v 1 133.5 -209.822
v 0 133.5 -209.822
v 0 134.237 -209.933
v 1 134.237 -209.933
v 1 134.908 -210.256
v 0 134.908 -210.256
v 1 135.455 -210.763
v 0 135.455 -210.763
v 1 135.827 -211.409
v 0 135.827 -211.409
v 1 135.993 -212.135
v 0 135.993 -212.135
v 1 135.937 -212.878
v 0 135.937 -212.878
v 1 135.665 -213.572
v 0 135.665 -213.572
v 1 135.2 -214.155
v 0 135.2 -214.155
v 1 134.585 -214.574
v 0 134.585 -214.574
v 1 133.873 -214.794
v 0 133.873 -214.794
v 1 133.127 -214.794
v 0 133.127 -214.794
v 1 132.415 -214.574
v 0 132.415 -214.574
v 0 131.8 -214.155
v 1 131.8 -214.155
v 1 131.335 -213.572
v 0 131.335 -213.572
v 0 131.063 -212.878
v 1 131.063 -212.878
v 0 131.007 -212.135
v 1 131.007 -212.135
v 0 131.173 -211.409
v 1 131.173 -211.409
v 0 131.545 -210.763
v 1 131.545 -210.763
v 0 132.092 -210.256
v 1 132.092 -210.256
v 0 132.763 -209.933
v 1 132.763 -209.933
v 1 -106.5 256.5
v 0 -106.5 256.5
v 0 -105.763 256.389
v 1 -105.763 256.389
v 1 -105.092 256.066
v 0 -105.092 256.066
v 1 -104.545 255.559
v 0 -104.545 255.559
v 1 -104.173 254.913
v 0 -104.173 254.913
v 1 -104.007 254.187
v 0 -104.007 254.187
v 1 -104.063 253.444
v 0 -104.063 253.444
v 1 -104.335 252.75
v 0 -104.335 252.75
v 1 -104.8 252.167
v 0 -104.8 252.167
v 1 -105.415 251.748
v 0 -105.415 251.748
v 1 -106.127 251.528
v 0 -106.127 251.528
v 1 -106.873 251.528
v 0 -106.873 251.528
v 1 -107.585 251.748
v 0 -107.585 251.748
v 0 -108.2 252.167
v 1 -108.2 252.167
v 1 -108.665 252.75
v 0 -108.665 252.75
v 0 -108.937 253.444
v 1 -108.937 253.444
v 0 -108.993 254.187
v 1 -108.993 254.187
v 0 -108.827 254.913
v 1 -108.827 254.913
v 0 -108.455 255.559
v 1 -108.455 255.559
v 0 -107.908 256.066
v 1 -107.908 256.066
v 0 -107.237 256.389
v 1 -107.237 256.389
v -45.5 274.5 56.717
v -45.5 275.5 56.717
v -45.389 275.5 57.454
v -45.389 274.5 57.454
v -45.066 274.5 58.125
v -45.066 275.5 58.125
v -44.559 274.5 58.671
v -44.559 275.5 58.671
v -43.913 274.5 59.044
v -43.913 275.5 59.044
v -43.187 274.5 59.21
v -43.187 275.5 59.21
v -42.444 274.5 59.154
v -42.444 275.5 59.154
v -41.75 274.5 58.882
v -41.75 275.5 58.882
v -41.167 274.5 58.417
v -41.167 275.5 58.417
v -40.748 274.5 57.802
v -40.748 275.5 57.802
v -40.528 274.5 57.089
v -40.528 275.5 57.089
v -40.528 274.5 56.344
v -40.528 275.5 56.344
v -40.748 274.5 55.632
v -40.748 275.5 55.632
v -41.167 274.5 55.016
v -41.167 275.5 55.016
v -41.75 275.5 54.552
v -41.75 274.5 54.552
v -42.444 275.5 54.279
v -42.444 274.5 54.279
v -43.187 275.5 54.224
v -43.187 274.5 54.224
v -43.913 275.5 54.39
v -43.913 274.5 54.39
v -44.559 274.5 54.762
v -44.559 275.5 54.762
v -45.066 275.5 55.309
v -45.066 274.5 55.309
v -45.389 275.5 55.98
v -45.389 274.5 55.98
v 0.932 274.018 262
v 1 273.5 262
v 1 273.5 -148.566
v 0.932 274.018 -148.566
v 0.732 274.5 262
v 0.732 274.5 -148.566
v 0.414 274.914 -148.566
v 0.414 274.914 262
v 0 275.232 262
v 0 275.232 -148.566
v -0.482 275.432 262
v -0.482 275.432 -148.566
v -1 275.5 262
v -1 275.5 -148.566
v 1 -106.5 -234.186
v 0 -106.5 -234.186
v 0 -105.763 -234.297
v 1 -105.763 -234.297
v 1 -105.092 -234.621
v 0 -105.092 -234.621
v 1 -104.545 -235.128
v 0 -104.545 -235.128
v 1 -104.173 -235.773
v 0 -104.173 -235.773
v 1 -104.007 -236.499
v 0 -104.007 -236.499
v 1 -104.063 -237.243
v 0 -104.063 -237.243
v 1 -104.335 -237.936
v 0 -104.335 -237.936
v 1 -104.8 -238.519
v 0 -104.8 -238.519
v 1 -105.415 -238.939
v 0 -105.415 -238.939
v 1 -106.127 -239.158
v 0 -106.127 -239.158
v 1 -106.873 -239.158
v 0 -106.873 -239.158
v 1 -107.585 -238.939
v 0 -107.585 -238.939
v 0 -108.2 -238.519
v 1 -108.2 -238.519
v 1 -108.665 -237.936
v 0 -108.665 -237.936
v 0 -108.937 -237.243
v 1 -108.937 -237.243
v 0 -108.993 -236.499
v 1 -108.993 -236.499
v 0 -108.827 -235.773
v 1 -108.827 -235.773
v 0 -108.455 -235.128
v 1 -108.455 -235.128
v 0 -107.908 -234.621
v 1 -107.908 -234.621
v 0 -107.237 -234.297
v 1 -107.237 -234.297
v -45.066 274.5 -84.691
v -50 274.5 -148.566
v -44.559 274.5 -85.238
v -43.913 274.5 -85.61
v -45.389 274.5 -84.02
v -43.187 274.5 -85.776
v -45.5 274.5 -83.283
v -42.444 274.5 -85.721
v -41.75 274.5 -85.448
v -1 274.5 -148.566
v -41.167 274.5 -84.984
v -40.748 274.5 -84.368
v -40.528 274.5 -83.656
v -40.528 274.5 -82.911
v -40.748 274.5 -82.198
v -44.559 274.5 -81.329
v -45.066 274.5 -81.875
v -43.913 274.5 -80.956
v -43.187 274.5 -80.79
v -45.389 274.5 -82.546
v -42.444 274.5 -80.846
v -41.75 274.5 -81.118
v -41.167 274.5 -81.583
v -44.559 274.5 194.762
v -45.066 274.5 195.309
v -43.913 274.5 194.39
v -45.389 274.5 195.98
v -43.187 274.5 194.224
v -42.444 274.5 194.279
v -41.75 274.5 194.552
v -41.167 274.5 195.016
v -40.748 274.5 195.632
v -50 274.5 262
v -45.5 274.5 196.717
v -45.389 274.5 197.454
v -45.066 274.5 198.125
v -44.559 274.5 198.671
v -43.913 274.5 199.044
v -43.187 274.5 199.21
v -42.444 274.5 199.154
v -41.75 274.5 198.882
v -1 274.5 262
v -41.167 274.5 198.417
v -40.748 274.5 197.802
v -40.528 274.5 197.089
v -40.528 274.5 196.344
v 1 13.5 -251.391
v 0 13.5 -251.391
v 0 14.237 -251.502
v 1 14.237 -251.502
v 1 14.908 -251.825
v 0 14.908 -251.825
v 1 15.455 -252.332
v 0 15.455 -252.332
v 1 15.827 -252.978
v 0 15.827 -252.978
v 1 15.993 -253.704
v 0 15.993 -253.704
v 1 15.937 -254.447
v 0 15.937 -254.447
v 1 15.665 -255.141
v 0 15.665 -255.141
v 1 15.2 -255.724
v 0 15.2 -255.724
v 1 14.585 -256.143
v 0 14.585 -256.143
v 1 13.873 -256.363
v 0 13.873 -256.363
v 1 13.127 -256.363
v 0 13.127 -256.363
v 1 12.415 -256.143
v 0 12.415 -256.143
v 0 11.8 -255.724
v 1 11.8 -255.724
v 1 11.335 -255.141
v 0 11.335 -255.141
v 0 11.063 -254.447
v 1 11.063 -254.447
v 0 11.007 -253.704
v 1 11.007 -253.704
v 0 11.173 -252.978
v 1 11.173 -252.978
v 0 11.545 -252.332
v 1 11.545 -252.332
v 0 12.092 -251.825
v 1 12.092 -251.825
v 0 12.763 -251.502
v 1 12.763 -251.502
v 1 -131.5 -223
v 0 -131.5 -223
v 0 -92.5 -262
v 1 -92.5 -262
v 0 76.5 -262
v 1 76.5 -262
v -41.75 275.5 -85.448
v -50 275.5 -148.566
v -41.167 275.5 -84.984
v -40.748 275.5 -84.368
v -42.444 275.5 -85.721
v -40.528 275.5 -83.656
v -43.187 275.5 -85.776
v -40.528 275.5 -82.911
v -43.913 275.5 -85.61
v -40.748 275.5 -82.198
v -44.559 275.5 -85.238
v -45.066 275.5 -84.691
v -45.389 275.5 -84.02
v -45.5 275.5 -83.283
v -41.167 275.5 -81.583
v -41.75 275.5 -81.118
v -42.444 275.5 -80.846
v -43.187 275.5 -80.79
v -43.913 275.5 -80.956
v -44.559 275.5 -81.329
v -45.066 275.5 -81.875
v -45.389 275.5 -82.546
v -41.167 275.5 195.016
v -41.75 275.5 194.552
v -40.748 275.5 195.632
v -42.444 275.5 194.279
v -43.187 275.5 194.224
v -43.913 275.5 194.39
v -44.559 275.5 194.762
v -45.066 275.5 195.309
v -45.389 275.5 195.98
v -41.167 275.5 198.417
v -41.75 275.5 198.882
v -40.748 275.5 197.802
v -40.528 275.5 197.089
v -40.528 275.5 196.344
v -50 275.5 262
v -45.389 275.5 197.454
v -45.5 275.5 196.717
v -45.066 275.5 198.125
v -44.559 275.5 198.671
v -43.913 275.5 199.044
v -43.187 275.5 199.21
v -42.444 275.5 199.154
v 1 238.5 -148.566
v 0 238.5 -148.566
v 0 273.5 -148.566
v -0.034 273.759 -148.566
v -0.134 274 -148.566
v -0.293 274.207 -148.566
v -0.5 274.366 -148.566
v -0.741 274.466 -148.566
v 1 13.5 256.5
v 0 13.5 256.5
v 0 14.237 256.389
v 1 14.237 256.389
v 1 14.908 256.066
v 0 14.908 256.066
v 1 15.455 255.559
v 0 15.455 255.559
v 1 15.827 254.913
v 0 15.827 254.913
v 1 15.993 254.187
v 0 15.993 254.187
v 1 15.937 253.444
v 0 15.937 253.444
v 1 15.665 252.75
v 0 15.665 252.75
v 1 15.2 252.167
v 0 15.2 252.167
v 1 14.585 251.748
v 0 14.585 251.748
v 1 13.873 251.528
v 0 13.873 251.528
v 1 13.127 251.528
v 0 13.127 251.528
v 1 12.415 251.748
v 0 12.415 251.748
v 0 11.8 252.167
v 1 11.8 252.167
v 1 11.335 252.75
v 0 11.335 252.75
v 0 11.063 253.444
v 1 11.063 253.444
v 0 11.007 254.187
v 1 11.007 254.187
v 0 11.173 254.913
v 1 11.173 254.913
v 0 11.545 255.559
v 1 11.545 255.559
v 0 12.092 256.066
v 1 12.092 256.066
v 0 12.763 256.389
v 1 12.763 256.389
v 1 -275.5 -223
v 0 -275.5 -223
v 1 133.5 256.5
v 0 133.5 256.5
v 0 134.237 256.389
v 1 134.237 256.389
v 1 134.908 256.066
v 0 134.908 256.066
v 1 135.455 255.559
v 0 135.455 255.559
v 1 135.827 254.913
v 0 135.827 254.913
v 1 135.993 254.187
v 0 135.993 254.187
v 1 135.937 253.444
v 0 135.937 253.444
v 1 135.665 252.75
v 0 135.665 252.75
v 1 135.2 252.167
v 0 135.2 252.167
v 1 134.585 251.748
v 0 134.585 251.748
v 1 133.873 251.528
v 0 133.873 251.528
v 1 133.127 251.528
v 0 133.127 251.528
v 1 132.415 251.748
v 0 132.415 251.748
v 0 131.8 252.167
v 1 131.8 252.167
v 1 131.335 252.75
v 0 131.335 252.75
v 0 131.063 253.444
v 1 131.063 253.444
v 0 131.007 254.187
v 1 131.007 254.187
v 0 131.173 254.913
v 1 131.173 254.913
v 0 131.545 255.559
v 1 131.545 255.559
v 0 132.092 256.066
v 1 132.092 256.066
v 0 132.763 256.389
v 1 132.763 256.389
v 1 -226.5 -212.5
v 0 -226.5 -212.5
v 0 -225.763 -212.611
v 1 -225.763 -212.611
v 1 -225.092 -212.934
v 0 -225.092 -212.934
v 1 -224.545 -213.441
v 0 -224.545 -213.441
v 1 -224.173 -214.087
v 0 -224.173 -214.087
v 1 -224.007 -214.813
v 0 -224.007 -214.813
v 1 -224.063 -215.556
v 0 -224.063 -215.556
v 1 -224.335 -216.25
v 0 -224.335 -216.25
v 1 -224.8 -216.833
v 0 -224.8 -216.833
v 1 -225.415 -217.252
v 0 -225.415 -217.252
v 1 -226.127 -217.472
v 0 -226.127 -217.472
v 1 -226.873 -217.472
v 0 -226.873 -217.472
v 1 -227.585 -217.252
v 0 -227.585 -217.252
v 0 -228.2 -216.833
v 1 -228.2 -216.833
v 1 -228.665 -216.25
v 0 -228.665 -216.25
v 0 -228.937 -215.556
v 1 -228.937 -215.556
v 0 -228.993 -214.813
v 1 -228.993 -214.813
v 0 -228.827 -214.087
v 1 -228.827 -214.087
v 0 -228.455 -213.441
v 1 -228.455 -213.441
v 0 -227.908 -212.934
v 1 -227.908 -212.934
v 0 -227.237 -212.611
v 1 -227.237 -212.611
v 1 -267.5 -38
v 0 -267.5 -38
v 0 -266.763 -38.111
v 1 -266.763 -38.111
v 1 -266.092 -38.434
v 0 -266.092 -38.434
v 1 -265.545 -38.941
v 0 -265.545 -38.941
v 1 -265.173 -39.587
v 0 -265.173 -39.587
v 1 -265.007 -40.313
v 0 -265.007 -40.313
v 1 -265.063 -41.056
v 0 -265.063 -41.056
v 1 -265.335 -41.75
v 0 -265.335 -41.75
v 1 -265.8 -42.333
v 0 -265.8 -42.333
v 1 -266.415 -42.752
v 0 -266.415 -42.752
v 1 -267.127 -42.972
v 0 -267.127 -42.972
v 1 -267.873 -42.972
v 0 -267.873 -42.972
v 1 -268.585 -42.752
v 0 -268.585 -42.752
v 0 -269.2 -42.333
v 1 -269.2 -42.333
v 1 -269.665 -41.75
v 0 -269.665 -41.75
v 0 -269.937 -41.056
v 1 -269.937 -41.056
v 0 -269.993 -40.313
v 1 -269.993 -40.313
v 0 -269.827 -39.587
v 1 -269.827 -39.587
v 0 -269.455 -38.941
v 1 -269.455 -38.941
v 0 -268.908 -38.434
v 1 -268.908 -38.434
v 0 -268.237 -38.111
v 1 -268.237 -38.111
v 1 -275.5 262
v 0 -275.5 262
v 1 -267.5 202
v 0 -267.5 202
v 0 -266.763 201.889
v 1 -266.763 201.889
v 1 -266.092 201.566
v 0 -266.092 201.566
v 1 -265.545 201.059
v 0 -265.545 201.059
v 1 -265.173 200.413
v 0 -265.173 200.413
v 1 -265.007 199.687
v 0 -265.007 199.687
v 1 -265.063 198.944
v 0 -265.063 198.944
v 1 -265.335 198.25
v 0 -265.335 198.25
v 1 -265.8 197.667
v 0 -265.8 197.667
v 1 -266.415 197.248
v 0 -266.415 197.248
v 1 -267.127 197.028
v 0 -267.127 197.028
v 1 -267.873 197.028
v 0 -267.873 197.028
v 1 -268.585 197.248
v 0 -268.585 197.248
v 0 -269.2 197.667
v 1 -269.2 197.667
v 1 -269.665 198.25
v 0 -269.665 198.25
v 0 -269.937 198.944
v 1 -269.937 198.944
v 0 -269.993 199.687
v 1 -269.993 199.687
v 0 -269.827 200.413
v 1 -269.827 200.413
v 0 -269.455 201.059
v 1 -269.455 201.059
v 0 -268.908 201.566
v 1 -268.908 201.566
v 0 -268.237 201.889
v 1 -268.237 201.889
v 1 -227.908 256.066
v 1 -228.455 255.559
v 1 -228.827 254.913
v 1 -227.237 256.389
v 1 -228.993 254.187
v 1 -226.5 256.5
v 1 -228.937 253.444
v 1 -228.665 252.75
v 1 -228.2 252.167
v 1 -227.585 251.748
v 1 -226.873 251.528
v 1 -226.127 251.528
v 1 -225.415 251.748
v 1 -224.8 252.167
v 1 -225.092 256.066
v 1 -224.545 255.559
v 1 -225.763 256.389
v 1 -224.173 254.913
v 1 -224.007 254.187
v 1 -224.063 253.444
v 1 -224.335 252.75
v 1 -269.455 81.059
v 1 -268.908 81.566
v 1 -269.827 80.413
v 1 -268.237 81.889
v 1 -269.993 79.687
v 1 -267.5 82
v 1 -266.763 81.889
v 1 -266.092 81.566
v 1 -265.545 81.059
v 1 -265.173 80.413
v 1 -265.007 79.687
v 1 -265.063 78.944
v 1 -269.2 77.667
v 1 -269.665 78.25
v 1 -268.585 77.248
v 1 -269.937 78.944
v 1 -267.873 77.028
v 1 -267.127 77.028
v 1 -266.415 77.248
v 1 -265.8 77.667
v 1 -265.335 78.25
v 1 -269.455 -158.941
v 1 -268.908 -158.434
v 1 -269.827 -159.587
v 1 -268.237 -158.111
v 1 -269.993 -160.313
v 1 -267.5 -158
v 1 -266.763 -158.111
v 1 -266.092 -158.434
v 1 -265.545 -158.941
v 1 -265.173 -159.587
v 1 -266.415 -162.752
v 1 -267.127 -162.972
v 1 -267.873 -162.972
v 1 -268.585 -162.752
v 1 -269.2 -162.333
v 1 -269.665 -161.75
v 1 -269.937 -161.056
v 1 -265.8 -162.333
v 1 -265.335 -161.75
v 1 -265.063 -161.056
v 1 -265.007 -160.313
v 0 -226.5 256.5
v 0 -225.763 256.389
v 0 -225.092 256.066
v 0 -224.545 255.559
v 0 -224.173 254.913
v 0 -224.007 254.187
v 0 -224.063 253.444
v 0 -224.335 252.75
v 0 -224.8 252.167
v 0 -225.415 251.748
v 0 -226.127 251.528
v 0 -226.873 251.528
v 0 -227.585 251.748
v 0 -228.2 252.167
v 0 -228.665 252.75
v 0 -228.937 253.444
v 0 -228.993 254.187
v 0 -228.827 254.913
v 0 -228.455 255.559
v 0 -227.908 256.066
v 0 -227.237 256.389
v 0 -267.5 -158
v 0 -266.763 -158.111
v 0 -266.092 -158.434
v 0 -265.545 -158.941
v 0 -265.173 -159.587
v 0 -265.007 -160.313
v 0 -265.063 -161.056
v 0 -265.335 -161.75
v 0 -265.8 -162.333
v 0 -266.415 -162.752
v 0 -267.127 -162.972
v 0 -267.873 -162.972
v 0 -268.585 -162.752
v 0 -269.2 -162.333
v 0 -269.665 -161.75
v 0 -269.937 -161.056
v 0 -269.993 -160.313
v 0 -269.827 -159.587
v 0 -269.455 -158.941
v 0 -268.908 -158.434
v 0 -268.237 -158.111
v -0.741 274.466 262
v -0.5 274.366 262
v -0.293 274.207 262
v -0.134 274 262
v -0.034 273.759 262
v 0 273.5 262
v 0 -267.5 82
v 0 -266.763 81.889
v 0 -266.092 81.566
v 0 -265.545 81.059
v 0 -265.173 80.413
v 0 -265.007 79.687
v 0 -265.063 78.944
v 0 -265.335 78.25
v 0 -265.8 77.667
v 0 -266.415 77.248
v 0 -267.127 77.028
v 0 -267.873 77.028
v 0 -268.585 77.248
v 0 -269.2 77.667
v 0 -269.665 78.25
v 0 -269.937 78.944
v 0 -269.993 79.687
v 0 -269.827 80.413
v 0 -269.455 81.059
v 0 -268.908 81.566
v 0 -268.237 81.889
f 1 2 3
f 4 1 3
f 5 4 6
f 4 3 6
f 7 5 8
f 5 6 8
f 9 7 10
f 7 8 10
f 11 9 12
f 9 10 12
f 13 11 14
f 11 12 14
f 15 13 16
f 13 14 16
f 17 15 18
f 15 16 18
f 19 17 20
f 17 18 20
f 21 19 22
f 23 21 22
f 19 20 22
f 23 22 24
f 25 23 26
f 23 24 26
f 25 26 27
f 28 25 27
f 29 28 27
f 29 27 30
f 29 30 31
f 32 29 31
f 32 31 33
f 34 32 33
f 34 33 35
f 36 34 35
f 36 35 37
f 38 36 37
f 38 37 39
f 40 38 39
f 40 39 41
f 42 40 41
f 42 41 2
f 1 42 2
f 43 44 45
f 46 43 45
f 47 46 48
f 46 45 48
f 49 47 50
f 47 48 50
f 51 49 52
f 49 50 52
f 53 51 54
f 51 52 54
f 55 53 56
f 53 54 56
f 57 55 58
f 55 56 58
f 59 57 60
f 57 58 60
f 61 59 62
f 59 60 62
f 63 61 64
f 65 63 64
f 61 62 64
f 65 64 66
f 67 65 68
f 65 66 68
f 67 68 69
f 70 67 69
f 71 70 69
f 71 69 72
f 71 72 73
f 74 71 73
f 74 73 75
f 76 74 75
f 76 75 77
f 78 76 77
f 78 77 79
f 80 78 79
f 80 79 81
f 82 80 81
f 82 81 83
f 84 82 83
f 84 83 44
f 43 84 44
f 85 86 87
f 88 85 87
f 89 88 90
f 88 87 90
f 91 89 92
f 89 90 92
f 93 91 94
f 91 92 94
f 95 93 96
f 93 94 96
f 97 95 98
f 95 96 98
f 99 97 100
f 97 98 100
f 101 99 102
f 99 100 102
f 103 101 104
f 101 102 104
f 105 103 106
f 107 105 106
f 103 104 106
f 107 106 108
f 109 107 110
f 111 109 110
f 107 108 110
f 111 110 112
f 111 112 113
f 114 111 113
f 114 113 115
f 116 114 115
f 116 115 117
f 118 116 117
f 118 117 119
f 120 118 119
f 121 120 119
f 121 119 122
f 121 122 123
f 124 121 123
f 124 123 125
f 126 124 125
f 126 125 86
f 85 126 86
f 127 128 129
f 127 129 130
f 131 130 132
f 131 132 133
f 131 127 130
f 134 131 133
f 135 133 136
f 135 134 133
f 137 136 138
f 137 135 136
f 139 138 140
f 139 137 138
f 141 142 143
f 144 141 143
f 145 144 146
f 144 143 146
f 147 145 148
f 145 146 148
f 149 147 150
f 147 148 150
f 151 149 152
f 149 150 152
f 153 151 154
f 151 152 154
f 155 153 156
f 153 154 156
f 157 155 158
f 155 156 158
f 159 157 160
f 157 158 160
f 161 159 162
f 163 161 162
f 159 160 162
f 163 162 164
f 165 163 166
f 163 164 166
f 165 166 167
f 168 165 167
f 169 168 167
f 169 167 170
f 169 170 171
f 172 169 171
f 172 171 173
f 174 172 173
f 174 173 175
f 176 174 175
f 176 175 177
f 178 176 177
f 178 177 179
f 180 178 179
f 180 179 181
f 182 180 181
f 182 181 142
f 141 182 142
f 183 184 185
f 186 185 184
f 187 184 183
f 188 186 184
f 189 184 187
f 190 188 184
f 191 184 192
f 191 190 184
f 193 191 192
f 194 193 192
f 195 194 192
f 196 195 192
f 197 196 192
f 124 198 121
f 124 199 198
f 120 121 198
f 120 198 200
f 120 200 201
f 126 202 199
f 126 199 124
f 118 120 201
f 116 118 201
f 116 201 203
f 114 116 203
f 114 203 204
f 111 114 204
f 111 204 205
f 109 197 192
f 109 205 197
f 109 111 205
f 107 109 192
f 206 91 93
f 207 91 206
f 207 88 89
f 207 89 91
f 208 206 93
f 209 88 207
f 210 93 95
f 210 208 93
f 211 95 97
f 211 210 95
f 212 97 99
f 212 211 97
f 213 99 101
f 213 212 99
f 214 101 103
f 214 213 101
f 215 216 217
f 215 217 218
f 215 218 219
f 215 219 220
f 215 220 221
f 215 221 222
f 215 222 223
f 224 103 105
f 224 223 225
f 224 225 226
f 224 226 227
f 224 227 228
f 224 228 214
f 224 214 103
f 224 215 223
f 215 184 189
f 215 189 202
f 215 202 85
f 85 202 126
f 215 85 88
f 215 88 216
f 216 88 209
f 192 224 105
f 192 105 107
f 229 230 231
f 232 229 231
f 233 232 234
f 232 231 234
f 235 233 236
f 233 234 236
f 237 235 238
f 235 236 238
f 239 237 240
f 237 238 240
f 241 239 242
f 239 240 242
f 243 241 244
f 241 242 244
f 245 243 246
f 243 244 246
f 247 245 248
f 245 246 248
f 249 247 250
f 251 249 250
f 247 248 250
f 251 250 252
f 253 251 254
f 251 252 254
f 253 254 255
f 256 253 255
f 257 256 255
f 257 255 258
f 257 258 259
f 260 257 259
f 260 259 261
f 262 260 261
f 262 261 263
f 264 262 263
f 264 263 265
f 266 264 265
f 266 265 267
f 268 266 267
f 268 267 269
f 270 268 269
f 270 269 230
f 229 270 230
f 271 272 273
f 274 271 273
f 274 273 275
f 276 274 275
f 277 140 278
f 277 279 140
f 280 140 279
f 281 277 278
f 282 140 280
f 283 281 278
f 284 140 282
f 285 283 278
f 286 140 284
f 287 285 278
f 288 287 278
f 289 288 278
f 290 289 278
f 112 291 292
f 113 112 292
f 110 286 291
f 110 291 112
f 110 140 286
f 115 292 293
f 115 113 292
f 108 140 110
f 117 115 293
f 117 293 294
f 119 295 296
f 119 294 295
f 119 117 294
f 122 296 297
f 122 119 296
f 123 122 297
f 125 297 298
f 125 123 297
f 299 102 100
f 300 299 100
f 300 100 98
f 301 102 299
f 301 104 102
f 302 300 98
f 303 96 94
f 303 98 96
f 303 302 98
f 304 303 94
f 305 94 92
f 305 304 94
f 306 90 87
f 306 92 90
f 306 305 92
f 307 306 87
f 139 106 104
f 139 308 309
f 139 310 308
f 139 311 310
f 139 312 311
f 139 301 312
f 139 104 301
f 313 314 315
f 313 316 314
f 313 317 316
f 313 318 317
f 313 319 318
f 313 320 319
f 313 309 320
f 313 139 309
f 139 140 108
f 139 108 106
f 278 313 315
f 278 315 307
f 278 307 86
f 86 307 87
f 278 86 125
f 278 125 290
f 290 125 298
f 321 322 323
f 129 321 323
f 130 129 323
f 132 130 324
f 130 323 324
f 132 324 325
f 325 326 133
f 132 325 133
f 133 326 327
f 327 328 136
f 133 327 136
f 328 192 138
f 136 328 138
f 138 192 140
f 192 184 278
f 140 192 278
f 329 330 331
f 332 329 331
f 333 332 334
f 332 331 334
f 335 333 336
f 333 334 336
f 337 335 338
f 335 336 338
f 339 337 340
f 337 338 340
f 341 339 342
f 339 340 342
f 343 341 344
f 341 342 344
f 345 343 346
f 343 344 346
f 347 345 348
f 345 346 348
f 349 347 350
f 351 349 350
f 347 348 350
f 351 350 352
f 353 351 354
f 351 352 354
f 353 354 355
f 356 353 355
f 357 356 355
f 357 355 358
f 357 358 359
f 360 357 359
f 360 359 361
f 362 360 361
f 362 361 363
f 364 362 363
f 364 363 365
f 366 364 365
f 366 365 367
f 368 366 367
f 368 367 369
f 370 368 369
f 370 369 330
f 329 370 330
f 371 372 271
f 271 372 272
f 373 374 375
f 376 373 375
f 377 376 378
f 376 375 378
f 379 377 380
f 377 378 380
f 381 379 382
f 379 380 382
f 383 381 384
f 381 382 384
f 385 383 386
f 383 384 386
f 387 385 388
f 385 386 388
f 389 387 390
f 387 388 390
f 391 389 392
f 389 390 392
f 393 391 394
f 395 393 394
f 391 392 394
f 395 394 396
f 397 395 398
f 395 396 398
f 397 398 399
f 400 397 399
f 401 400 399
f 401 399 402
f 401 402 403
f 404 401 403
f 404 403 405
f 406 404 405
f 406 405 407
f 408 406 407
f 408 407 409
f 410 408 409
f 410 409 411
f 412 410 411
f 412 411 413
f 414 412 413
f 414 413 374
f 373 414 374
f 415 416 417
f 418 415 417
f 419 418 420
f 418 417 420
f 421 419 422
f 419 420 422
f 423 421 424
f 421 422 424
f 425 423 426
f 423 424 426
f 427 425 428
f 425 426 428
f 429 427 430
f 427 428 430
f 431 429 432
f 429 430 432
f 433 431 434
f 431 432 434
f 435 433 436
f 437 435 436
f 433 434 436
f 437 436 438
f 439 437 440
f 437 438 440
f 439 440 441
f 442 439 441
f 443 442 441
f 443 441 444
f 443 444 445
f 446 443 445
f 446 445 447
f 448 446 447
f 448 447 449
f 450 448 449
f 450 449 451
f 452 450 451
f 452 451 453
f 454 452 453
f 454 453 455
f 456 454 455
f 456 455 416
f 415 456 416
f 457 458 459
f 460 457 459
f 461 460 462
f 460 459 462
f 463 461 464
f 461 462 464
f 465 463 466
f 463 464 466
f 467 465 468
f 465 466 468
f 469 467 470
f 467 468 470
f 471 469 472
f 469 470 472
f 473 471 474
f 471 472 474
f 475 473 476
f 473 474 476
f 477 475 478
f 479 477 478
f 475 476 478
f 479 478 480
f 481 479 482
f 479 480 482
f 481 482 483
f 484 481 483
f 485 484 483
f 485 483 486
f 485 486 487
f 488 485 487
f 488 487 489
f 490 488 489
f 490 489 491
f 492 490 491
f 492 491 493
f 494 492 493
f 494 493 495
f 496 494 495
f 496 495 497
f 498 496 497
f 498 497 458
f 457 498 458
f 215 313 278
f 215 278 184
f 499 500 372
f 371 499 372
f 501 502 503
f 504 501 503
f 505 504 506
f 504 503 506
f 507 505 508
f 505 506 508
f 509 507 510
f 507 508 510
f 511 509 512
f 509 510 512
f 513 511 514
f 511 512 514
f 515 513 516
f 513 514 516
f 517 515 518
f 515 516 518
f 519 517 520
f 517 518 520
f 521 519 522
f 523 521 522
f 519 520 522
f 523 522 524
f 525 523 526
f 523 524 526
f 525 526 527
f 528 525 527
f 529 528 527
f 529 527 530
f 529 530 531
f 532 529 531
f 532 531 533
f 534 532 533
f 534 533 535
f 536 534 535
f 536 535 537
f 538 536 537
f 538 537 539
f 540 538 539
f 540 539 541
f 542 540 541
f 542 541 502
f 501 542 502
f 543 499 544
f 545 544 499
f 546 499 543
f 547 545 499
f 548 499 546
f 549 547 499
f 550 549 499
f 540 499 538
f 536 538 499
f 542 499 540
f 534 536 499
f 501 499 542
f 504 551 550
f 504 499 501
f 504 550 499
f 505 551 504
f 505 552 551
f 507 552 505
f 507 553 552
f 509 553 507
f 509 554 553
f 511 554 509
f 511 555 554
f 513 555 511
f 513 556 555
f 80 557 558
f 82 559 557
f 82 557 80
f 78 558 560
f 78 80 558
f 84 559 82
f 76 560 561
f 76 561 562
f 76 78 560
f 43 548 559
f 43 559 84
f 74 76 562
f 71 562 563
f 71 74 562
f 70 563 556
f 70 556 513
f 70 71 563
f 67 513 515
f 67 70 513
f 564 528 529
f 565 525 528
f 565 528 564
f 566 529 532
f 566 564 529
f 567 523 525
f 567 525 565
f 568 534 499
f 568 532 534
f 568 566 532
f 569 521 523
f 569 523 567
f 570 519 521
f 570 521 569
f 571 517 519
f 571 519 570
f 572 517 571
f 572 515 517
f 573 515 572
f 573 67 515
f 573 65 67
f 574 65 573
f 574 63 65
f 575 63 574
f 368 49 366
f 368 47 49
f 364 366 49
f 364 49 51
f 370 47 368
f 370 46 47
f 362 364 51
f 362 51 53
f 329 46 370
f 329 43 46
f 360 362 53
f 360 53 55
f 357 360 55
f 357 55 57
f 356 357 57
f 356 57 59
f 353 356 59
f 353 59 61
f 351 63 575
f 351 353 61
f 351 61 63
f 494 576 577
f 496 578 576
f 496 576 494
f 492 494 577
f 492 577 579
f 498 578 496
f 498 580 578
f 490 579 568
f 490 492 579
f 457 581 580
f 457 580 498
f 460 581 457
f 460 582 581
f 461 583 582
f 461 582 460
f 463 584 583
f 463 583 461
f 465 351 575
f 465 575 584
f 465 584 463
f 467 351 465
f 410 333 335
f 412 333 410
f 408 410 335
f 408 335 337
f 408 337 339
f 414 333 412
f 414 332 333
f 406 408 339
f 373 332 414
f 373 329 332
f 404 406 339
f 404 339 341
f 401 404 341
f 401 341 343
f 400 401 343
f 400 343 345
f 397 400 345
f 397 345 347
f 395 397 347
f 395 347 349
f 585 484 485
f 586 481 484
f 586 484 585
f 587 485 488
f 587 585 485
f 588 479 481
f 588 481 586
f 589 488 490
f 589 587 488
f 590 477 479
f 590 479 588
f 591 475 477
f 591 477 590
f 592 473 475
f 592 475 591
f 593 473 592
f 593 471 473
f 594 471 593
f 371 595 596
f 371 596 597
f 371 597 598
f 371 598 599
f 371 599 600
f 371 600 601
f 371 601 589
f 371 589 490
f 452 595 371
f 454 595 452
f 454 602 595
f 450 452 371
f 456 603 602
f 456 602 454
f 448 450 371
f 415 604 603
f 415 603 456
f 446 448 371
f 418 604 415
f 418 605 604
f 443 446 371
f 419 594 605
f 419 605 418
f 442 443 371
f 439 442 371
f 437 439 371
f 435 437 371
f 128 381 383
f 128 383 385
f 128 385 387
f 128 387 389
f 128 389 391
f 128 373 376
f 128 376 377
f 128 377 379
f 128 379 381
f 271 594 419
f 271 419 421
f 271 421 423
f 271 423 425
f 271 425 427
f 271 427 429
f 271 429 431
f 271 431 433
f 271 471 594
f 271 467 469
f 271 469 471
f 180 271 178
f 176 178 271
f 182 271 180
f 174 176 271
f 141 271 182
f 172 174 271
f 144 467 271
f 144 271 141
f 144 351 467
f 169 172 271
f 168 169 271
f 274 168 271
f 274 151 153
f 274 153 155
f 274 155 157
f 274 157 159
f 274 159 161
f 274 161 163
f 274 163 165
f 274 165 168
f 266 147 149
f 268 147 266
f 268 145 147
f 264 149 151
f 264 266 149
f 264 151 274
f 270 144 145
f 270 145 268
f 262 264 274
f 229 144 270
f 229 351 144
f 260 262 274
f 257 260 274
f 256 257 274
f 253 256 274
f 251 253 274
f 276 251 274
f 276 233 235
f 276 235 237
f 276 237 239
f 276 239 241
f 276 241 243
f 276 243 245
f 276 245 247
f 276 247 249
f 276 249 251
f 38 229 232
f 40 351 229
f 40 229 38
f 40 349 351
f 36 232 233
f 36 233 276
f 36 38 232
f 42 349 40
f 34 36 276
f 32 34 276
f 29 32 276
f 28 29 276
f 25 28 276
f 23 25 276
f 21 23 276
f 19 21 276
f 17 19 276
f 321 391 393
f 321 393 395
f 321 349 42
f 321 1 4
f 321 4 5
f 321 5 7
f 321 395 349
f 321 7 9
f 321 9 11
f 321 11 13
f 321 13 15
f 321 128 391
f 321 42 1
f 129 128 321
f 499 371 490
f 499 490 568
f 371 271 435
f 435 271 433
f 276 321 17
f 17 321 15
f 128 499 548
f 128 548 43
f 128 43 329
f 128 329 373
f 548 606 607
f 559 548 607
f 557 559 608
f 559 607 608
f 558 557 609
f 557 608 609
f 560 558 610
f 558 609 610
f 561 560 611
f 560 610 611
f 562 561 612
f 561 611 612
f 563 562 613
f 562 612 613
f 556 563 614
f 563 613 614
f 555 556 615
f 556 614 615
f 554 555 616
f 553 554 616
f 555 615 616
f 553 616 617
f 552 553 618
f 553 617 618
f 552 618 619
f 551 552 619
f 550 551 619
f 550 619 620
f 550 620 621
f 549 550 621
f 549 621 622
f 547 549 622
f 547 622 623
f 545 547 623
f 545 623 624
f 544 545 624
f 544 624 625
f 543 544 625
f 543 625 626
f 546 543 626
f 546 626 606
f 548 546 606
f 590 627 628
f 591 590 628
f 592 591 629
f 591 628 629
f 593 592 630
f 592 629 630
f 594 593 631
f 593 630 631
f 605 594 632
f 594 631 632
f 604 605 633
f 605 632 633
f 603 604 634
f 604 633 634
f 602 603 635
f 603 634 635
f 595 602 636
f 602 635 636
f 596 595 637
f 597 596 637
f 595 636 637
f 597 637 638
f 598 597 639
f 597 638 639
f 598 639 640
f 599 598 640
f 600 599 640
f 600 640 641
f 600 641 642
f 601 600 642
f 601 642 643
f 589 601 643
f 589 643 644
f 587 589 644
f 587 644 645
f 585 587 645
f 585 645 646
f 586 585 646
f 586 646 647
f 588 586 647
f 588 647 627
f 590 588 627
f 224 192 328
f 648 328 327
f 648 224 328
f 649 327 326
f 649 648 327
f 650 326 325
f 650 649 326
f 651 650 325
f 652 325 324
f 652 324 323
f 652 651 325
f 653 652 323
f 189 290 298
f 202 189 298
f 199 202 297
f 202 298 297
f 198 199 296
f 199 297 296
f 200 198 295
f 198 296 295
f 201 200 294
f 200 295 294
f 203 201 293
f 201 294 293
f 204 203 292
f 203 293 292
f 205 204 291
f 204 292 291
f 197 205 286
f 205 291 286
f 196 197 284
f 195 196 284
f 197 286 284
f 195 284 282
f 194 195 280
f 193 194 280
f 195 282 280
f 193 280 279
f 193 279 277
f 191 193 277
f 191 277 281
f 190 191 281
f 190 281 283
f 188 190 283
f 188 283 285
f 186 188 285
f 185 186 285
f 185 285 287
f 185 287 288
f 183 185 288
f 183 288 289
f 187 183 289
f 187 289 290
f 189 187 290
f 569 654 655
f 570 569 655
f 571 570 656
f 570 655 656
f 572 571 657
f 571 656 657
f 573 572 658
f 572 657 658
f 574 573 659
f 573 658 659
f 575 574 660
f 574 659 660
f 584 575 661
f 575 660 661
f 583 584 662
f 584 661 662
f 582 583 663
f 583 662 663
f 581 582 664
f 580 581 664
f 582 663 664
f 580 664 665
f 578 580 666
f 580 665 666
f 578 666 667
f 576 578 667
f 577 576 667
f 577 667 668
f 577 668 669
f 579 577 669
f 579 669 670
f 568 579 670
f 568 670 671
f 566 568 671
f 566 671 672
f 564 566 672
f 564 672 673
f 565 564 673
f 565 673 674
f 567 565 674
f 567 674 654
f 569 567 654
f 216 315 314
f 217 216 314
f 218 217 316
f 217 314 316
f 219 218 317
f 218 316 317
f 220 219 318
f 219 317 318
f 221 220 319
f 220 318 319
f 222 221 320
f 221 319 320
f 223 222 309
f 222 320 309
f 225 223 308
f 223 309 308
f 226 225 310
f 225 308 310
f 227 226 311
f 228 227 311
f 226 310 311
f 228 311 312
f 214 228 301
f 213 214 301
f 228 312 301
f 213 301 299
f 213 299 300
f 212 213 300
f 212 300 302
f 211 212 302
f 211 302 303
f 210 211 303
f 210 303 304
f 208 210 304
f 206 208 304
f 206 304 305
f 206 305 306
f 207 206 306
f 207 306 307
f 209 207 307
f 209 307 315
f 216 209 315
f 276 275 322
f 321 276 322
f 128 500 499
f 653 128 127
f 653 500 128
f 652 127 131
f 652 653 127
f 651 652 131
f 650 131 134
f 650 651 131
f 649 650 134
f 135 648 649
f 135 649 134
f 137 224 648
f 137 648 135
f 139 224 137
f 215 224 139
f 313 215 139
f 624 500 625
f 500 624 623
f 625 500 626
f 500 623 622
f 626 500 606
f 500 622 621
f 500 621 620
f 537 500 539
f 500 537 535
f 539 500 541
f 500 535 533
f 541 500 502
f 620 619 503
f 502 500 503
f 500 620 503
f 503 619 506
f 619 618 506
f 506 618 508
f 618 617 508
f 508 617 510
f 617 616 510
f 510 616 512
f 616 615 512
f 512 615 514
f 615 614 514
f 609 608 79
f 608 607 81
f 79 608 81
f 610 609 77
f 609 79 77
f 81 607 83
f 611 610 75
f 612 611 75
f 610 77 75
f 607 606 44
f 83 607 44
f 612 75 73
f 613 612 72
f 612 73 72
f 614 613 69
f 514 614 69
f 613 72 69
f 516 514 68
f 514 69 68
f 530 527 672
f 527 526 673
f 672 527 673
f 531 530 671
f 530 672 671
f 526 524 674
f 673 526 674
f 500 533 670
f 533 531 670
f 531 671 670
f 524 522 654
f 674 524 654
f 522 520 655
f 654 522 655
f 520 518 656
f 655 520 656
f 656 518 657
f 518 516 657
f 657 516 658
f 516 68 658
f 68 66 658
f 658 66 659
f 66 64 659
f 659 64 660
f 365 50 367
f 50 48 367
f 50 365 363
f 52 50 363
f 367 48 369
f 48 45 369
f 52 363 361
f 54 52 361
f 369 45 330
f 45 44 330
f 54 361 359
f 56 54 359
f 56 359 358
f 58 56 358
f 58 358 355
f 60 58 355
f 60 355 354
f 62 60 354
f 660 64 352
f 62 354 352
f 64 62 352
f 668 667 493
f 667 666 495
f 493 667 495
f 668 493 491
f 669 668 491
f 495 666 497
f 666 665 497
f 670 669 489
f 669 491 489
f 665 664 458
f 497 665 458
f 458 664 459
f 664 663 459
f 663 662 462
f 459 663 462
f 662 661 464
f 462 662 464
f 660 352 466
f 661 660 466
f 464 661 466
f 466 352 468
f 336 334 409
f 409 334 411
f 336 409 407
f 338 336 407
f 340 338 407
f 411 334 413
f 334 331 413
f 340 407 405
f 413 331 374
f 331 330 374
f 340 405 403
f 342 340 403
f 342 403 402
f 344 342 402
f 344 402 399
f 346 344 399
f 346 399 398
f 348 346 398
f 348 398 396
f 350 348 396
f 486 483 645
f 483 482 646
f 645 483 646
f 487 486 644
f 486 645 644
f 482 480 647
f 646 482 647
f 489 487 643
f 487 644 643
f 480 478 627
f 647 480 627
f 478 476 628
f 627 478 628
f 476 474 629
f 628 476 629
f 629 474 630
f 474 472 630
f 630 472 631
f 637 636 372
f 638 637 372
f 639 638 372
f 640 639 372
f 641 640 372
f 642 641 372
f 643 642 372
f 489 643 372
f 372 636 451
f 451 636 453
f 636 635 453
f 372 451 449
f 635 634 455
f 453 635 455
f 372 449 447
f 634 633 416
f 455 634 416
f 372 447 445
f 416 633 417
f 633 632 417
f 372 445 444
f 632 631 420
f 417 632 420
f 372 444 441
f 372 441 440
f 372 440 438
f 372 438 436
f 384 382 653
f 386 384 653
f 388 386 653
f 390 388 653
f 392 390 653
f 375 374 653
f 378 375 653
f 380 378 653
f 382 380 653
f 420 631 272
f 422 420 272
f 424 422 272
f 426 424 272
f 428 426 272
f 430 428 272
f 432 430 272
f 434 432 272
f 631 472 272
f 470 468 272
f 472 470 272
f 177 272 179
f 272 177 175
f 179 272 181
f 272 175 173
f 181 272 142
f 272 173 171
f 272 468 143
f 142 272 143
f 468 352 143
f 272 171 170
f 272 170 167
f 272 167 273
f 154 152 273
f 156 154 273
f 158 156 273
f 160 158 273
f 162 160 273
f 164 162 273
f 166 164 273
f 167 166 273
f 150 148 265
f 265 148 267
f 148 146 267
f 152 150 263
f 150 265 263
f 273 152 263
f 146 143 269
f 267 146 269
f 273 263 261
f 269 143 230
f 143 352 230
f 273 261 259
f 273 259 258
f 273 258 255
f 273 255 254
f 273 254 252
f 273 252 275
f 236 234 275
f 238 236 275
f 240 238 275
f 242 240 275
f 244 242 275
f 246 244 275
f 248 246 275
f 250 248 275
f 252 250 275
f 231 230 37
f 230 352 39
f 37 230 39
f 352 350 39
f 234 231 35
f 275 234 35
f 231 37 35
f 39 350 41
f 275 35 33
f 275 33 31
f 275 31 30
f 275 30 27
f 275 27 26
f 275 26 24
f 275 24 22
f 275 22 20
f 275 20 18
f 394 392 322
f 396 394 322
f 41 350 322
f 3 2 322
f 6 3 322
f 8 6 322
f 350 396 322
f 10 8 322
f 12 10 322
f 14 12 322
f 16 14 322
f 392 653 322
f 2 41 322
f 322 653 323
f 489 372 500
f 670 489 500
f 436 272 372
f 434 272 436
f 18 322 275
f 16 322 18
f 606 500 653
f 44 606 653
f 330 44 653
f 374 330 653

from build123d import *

# Parameters (mm, degrees)
EXTRUDE_1_DEPTH                  = 1
SM_EDGE_FLANGE_1_STRIP_W         = 6
SM_EDGE_FLANGE_1_STRIP_H         = 1
SM_EDGE_FLANGE_1_STRIP_CUT_DEPTH = 410.56637881
SM_EDGE_FLANGE_1_DEPTH           = 410.56637881
CUT_EXTRUDE_1_REACH              = 385.463
SKETCH_12_R                      = 2.5
CUT_EXTRUDE_2_REACH              = 614.164
SKETCH_13_R                      = 2.5


# Sheet-metal steps are written as plain solids
with BuildPart() as part:
    # Sketch 1 → Бобышка-Вытянуть1 (new body)
    with BuildSketch(Plane(origin=(0, 0, 0), x_dir=(0, 0, -1), z_dir=(1, 0, 0))):
        Polygon((223, -275.5), (223, -131.5), (262, -92.5), (262, 76.5), (148.56637881, 238.5), (148.56637881, 275.5), (-262, 275.5), (-262, -275.5), align=None)
    extrude(amount=EXTRUDE_1_DEPTH)

    # Ребро-кромка1 strip (across the edge) → Ребро-кромка1 strip cut (cut)
    with BuildSketch(Plane(origin=(0, 275.5, 262), x_dir=(0, -1, 0), z_dir=(0, 0, -1))):
        with Locations((-1, -0.5)):
            Rectangle(SM_EDGE_FLANGE_1_STRIP_W, SM_EDGE_FLANGE_1_STRIP_H)
    extrude(amount=SM_EDGE_FLANGE_1_STRIP_CUT_DEPTH, mode=Mode.SUBTRACT)

    # Ребро-кромка1 section (across the edge) → Ребро-кромка1 (add)
    with BuildSketch(Plane(origin=(0, 275.5, 262), x_dir=(0, -1, 0), z_dir=(0, 0, -1))):
        with BuildLine():
            Line((0, 1), (0, 50))
            Line((0, 50), (1, 50))
            Line((1, 50), (1, 1))
            ThreePointArc((1, 1), (1.292893219, 0.292893219), (2, 0))
            Line((2, 0), (2, -1))
            ThreePointArc((2, -1), (0.585786438, -0.414213562), (0, 1))
        make_face()
    extrude(amount=SM_EDGE_FLANGE_1_DEPTH)

    # Эскиз12 → Вырез-Вытянуть1 (cut, up to next)
    with BuildSketch(Plane.ZY, mode=Mode.PRIVATE) as cut_extrude_1_sk1:
        with Locations((254, 133.5)):
            Circle(SKETCH_12_R)
    cut_extrude_1_tool1 = extrude(cut_extrude_1_sk1.sketch, amount=-CUT_EXTRUDE_1_REACH, mode=Mode.PRIVATE) & part.part
    # Эскиз12 → Вырез-Вытянуть1 (cut, up to next)
    with BuildSketch(Plane.ZY, mode=Mode.PRIVATE) as cut_extrude_1_sk2:
        with Locations((254, 13.5)):
            Circle(SKETCH_12_R)
    cut_extrude_1_tool2 = extrude(cut_extrude_1_sk2.sketch, amount=-CUT_EXTRUDE_1_REACH, mode=Mode.PRIVATE) & part.part
    # Эскиз12 → Вырез-Вытянуть1 (cut, up to next)
    with BuildSketch(Plane.ZY, mode=Mode.PRIVATE) as cut_extrude_1_sk3:
        with Locations((254, -106.5)):
            Circle(SKETCH_12_R)
    cut_extrude_1_tool3 = extrude(cut_extrude_1_sk3.sketch, amount=-CUT_EXTRUDE_1_REACH, mode=Mode.PRIVATE) & part.part
    # Эскиз12 → Вырез-Вытянуть1 (cut, up to next)
    with BuildSketch(Plane.ZY, mode=Mode.PRIVATE) as cut_extrude_1_sk4:
        with Locations((254, -226.5)):
            Circle(SKETCH_12_R)
    cut_extrude_1_tool4 = extrude(cut_extrude_1_sk4.sketch, amount=-CUT_EXTRUDE_1_REACH, mode=Mode.PRIVATE) & part.part
    # Эскиз12 → Вырез-Вытянуть1 (cut, up to next)
    with BuildSketch(Plane.ZY, mode=Mode.PRIVATE) as cut_extrude_1_sk5:
        with Locations((199.5, -267.5)):
            Circle(SKETCH_12_R)
    cut_extrude_1_tool5 = extrude(cut_extrude_1_sk5.sketch, amount=-CUT_EXTRUDE_1_REACH, mode=Mode.PRIVATE) & part.part
    # Эскиз12 → Вырез-Вытянуть1 (cut, up to next)
    with BuildSketch(Plane.ZY, mode=Mode.PRIVATE) as cut_extrude_1_sk6:
        with Locations((79.5, -267.5)):
            Circle(SKETCH_12_R)
    cut_extrude_1_tool6 = extrude(cut_extrude_1_sk6.sketch, amount=-CUT_EXTRUDE_1_REACH, mode=Mode.PRIVATE) & part.part
    # Эскиз12 → Вырез-Вытянуть1 (cut, up to next)
    with BuildSketch(Plane.ZY, mode=Mode.PRIVATE) as cut_extrude_1_sk7:
        with Locations((-40.5, -267.5)):
            Circle(SKETCH_12_R)
    cut_extrude_1_tool7 = extrude(cut_extrude_1_sk7.sketch, amount=-CUT_EXTRUDE_1_REACH, mode=Mode.PRIVATE) & part.part
    # Эскиз12 → Вырез-Вытянуть1 (cut, up to next)
    with BuildSketch(Plane.ZY, mode=Mode.PRIVATE) as cut_extrude_1_sk8:
        with Locations((-160.5, -267.5)):
            Circle(SKETCH_12_R)
    cut_extrude_1_tool8 = extrude(cut_extrude_1_sk8.sketch, amount=-CUT_EXTRUDE_1_REACH, mode=Mode.PRIVATE) & part.part
    # Эскиз12 → Вырез-Вытянуть1 (cut, up to next)
    with BuildSketch(Plane.ZY, mode=Mode.PRIVATE) as cut_extrude_1_sk9:
        with Locations((-215, -226.5)):
            Circle(SKETCH_12_R)
    cut_extrude_1_tool9 = extrude(cut_extrude_1_sk9.sketch, amount=-CUT_EXTRUDE_1_REACH, mode=Mode.PRIVATE) & part.part
    # Эскиз12 → Вырез-Вытянуть1 (cut, up to next)
    with BuildSketch(Plane.ZY, mode=Mode.PRIVATE) as cut_extrude_1_sk10:
        with Locations((-236.686291501, -106.5)):
            Circle(SKETCH_12_R)
    cut_extrude_1_tool10 = extrude(cut_extrude_1_sk10.sketch, amount=-CUT_EXTRUDE_1_REACH, mode=Mode.PRIVATE) & part.part
    # Эскиз12 → Вырез-Вытянуть1 (cut, up to next)
    with BuildSketch(Plane.ZY, mode=Mode.PRIVATE) as cut_extrude_1_sk11:
        with Locations((-253.890872965, 13.5)):
            Circle(SKETCH_12_R)
    cut_extrude_1_tool11 = extrude(cut_extrude_1_sk11.sketch, amount=-CUT_EXTRUDE_1_REACH, mode=Mode.PRIVATE) & part.part
    # Эскиз12 → Вырез-Вытянуть1 (cut, up to next)
    with BuildSketch(Plane.ZY, mode=Mode.PRIVATE) as cut_extrude_1_sk12:
        with Locations((-212.321973612, 133.5)):
            Circle(SKETCH_12_R)
    cut_extrude_1_tool12 = extrude(cut_extrude_1_sk12.sketch, amount=-CUT_EXTRUDE_1_REACH, mode=Mode.PRIVATE) & part.part
    add(cut_extrude_1_tool1.solids().sort_by_distance((0, 133.5, 254))[0], mode=Mode.SUBTRACT)
    add(cut_extrude_1_tool2.solids().sort_by_distance((0, 13.5, 254))[0], mode=Mode.SUBTRACT)
    add(cut_extrude_1_tool3.solids().sort_by_distance((0, -106.5, 254))[0], mode=Mode.SUBTRACT)
    add(cut_extrude_1_tool4.solids().sort_by_distance((0, -226.5, 254))[0], mode=Mode.SUBTRACT)
    add(cut_extrude_1_tool5.solids().sort_by_distance((0, -267.5, 199.5))[0], mode=Mode.SUBTRACT)
    add(cut_extrude_1_tool6.solids().sort_by_distance((0, -267.5, 79.5))[0], mode=Mode.SUBTRACT)
    add(cut_extrude_1_tool7.solids().sort_by_distance((0, -267.5, -40.5))[0], mode=Mode.SUBTRACT)
    add(cut_extrude_1_tool8.solids().sort_by_distance((0, -267.5, -160.5))[0], mode=Mode.SUBTRACT)
    add(cut_extrude_1_tool9.solids().sort_by_distance((0, -226.5, -215))[0], mode=Mode.SUBTRACT)
    add(cut_extrude_1_tool10.solids().sort_by_distance((0, -106.5, -236.686292))[0], mode=Mode.SUBTRACT)
    add(cut_extrude_1_tool11.solids().sort_by_distance((0, 13.5, -253.890873))[0], mode=Mode.SUBTRACT)
    add(cut_extrude_1_tool12.solids().sort_by_distance((0, 133.5, -212.321974))[0], mode=Mode.SUBTRACT)

    # Эскиз13 → Вырез-Вытянуть2 (cut, up to next)
    with BuildSketch(Plane(origin=(0, 275.5, 0), x_dir=(1, 0, 0), z_dir=(0, 1, 0)), mode=Mode.PRIVATE) as cut_extrude_2_sk1:
        with Locations(Location((-43, -196.716810595, 0), (0, 0, 180))):
            Circle(SKETCH_13_R)
    cut_extrude_2_tool1 = extrude(cut_extrude_2_sk1.sketch, amount=-CUT_EXTRUDE_2_REACH, mode=Mode.PRIVATE) & part.part
    # Эскиз13 → Вырез-Вытянуть2 (cut, up to next)
    with BuildSketch(Plane(origin=(0, 275.5, 0), x_dir=(1, 0, 0), z_dir=(0, 1, 0)), mode=Mode.PRIVATE) as cut_extrude_2_sk2:
        with Locations(Location((-43, -56.716810595, 0), (0, 0, 180))):
            Circle(SKETCH_13_R)
    cut_extrude_2_tool2 = extrude(cut_extrude_2_sk2.sketch, amount=-CUT_EXTRUDE_2_REACH, mode=Mode.PRIVATE) & part.part
    # Эскиз13 → Вырез-Вытянуть2 (cut, up to next)
    with BuildSketch(Plane(origin=(0, 275.5, 0), x_dir=(1, 0, 0), z_dir=(0, 1, 0)), mode=Mode.PRIVATE) as cut_extrude_2_sk3:
        with Locations(Location((-43, 83.283189405, 0), (0, 0, 180))):
            Circle(SKETCH_13_R)
    cut_extrude_2_tool3 = extrude(cut_extrude_2_sk3.sketch, amount=-CUT_EXTRUDE_2_REACH, mode=Mode.PRIVATE) & part.part
    add(cut_extrude_2_tool1.solids().sort_by_distance((-43, 275.5, 196.716811))[0], mode=Mode.SUBTRACT)
    add(cut_extrude_2_tool2.solids().sort_by_distance((-43, 275.5, 56.716811))[0], mode=Mode.SUBTRACT)
    add(cut_extrude_2_tool3.solids().sort_by_distance((-43, 275.5, -83.283189))[0], mode=Mode.SUBTRACT)


solid = part.part
